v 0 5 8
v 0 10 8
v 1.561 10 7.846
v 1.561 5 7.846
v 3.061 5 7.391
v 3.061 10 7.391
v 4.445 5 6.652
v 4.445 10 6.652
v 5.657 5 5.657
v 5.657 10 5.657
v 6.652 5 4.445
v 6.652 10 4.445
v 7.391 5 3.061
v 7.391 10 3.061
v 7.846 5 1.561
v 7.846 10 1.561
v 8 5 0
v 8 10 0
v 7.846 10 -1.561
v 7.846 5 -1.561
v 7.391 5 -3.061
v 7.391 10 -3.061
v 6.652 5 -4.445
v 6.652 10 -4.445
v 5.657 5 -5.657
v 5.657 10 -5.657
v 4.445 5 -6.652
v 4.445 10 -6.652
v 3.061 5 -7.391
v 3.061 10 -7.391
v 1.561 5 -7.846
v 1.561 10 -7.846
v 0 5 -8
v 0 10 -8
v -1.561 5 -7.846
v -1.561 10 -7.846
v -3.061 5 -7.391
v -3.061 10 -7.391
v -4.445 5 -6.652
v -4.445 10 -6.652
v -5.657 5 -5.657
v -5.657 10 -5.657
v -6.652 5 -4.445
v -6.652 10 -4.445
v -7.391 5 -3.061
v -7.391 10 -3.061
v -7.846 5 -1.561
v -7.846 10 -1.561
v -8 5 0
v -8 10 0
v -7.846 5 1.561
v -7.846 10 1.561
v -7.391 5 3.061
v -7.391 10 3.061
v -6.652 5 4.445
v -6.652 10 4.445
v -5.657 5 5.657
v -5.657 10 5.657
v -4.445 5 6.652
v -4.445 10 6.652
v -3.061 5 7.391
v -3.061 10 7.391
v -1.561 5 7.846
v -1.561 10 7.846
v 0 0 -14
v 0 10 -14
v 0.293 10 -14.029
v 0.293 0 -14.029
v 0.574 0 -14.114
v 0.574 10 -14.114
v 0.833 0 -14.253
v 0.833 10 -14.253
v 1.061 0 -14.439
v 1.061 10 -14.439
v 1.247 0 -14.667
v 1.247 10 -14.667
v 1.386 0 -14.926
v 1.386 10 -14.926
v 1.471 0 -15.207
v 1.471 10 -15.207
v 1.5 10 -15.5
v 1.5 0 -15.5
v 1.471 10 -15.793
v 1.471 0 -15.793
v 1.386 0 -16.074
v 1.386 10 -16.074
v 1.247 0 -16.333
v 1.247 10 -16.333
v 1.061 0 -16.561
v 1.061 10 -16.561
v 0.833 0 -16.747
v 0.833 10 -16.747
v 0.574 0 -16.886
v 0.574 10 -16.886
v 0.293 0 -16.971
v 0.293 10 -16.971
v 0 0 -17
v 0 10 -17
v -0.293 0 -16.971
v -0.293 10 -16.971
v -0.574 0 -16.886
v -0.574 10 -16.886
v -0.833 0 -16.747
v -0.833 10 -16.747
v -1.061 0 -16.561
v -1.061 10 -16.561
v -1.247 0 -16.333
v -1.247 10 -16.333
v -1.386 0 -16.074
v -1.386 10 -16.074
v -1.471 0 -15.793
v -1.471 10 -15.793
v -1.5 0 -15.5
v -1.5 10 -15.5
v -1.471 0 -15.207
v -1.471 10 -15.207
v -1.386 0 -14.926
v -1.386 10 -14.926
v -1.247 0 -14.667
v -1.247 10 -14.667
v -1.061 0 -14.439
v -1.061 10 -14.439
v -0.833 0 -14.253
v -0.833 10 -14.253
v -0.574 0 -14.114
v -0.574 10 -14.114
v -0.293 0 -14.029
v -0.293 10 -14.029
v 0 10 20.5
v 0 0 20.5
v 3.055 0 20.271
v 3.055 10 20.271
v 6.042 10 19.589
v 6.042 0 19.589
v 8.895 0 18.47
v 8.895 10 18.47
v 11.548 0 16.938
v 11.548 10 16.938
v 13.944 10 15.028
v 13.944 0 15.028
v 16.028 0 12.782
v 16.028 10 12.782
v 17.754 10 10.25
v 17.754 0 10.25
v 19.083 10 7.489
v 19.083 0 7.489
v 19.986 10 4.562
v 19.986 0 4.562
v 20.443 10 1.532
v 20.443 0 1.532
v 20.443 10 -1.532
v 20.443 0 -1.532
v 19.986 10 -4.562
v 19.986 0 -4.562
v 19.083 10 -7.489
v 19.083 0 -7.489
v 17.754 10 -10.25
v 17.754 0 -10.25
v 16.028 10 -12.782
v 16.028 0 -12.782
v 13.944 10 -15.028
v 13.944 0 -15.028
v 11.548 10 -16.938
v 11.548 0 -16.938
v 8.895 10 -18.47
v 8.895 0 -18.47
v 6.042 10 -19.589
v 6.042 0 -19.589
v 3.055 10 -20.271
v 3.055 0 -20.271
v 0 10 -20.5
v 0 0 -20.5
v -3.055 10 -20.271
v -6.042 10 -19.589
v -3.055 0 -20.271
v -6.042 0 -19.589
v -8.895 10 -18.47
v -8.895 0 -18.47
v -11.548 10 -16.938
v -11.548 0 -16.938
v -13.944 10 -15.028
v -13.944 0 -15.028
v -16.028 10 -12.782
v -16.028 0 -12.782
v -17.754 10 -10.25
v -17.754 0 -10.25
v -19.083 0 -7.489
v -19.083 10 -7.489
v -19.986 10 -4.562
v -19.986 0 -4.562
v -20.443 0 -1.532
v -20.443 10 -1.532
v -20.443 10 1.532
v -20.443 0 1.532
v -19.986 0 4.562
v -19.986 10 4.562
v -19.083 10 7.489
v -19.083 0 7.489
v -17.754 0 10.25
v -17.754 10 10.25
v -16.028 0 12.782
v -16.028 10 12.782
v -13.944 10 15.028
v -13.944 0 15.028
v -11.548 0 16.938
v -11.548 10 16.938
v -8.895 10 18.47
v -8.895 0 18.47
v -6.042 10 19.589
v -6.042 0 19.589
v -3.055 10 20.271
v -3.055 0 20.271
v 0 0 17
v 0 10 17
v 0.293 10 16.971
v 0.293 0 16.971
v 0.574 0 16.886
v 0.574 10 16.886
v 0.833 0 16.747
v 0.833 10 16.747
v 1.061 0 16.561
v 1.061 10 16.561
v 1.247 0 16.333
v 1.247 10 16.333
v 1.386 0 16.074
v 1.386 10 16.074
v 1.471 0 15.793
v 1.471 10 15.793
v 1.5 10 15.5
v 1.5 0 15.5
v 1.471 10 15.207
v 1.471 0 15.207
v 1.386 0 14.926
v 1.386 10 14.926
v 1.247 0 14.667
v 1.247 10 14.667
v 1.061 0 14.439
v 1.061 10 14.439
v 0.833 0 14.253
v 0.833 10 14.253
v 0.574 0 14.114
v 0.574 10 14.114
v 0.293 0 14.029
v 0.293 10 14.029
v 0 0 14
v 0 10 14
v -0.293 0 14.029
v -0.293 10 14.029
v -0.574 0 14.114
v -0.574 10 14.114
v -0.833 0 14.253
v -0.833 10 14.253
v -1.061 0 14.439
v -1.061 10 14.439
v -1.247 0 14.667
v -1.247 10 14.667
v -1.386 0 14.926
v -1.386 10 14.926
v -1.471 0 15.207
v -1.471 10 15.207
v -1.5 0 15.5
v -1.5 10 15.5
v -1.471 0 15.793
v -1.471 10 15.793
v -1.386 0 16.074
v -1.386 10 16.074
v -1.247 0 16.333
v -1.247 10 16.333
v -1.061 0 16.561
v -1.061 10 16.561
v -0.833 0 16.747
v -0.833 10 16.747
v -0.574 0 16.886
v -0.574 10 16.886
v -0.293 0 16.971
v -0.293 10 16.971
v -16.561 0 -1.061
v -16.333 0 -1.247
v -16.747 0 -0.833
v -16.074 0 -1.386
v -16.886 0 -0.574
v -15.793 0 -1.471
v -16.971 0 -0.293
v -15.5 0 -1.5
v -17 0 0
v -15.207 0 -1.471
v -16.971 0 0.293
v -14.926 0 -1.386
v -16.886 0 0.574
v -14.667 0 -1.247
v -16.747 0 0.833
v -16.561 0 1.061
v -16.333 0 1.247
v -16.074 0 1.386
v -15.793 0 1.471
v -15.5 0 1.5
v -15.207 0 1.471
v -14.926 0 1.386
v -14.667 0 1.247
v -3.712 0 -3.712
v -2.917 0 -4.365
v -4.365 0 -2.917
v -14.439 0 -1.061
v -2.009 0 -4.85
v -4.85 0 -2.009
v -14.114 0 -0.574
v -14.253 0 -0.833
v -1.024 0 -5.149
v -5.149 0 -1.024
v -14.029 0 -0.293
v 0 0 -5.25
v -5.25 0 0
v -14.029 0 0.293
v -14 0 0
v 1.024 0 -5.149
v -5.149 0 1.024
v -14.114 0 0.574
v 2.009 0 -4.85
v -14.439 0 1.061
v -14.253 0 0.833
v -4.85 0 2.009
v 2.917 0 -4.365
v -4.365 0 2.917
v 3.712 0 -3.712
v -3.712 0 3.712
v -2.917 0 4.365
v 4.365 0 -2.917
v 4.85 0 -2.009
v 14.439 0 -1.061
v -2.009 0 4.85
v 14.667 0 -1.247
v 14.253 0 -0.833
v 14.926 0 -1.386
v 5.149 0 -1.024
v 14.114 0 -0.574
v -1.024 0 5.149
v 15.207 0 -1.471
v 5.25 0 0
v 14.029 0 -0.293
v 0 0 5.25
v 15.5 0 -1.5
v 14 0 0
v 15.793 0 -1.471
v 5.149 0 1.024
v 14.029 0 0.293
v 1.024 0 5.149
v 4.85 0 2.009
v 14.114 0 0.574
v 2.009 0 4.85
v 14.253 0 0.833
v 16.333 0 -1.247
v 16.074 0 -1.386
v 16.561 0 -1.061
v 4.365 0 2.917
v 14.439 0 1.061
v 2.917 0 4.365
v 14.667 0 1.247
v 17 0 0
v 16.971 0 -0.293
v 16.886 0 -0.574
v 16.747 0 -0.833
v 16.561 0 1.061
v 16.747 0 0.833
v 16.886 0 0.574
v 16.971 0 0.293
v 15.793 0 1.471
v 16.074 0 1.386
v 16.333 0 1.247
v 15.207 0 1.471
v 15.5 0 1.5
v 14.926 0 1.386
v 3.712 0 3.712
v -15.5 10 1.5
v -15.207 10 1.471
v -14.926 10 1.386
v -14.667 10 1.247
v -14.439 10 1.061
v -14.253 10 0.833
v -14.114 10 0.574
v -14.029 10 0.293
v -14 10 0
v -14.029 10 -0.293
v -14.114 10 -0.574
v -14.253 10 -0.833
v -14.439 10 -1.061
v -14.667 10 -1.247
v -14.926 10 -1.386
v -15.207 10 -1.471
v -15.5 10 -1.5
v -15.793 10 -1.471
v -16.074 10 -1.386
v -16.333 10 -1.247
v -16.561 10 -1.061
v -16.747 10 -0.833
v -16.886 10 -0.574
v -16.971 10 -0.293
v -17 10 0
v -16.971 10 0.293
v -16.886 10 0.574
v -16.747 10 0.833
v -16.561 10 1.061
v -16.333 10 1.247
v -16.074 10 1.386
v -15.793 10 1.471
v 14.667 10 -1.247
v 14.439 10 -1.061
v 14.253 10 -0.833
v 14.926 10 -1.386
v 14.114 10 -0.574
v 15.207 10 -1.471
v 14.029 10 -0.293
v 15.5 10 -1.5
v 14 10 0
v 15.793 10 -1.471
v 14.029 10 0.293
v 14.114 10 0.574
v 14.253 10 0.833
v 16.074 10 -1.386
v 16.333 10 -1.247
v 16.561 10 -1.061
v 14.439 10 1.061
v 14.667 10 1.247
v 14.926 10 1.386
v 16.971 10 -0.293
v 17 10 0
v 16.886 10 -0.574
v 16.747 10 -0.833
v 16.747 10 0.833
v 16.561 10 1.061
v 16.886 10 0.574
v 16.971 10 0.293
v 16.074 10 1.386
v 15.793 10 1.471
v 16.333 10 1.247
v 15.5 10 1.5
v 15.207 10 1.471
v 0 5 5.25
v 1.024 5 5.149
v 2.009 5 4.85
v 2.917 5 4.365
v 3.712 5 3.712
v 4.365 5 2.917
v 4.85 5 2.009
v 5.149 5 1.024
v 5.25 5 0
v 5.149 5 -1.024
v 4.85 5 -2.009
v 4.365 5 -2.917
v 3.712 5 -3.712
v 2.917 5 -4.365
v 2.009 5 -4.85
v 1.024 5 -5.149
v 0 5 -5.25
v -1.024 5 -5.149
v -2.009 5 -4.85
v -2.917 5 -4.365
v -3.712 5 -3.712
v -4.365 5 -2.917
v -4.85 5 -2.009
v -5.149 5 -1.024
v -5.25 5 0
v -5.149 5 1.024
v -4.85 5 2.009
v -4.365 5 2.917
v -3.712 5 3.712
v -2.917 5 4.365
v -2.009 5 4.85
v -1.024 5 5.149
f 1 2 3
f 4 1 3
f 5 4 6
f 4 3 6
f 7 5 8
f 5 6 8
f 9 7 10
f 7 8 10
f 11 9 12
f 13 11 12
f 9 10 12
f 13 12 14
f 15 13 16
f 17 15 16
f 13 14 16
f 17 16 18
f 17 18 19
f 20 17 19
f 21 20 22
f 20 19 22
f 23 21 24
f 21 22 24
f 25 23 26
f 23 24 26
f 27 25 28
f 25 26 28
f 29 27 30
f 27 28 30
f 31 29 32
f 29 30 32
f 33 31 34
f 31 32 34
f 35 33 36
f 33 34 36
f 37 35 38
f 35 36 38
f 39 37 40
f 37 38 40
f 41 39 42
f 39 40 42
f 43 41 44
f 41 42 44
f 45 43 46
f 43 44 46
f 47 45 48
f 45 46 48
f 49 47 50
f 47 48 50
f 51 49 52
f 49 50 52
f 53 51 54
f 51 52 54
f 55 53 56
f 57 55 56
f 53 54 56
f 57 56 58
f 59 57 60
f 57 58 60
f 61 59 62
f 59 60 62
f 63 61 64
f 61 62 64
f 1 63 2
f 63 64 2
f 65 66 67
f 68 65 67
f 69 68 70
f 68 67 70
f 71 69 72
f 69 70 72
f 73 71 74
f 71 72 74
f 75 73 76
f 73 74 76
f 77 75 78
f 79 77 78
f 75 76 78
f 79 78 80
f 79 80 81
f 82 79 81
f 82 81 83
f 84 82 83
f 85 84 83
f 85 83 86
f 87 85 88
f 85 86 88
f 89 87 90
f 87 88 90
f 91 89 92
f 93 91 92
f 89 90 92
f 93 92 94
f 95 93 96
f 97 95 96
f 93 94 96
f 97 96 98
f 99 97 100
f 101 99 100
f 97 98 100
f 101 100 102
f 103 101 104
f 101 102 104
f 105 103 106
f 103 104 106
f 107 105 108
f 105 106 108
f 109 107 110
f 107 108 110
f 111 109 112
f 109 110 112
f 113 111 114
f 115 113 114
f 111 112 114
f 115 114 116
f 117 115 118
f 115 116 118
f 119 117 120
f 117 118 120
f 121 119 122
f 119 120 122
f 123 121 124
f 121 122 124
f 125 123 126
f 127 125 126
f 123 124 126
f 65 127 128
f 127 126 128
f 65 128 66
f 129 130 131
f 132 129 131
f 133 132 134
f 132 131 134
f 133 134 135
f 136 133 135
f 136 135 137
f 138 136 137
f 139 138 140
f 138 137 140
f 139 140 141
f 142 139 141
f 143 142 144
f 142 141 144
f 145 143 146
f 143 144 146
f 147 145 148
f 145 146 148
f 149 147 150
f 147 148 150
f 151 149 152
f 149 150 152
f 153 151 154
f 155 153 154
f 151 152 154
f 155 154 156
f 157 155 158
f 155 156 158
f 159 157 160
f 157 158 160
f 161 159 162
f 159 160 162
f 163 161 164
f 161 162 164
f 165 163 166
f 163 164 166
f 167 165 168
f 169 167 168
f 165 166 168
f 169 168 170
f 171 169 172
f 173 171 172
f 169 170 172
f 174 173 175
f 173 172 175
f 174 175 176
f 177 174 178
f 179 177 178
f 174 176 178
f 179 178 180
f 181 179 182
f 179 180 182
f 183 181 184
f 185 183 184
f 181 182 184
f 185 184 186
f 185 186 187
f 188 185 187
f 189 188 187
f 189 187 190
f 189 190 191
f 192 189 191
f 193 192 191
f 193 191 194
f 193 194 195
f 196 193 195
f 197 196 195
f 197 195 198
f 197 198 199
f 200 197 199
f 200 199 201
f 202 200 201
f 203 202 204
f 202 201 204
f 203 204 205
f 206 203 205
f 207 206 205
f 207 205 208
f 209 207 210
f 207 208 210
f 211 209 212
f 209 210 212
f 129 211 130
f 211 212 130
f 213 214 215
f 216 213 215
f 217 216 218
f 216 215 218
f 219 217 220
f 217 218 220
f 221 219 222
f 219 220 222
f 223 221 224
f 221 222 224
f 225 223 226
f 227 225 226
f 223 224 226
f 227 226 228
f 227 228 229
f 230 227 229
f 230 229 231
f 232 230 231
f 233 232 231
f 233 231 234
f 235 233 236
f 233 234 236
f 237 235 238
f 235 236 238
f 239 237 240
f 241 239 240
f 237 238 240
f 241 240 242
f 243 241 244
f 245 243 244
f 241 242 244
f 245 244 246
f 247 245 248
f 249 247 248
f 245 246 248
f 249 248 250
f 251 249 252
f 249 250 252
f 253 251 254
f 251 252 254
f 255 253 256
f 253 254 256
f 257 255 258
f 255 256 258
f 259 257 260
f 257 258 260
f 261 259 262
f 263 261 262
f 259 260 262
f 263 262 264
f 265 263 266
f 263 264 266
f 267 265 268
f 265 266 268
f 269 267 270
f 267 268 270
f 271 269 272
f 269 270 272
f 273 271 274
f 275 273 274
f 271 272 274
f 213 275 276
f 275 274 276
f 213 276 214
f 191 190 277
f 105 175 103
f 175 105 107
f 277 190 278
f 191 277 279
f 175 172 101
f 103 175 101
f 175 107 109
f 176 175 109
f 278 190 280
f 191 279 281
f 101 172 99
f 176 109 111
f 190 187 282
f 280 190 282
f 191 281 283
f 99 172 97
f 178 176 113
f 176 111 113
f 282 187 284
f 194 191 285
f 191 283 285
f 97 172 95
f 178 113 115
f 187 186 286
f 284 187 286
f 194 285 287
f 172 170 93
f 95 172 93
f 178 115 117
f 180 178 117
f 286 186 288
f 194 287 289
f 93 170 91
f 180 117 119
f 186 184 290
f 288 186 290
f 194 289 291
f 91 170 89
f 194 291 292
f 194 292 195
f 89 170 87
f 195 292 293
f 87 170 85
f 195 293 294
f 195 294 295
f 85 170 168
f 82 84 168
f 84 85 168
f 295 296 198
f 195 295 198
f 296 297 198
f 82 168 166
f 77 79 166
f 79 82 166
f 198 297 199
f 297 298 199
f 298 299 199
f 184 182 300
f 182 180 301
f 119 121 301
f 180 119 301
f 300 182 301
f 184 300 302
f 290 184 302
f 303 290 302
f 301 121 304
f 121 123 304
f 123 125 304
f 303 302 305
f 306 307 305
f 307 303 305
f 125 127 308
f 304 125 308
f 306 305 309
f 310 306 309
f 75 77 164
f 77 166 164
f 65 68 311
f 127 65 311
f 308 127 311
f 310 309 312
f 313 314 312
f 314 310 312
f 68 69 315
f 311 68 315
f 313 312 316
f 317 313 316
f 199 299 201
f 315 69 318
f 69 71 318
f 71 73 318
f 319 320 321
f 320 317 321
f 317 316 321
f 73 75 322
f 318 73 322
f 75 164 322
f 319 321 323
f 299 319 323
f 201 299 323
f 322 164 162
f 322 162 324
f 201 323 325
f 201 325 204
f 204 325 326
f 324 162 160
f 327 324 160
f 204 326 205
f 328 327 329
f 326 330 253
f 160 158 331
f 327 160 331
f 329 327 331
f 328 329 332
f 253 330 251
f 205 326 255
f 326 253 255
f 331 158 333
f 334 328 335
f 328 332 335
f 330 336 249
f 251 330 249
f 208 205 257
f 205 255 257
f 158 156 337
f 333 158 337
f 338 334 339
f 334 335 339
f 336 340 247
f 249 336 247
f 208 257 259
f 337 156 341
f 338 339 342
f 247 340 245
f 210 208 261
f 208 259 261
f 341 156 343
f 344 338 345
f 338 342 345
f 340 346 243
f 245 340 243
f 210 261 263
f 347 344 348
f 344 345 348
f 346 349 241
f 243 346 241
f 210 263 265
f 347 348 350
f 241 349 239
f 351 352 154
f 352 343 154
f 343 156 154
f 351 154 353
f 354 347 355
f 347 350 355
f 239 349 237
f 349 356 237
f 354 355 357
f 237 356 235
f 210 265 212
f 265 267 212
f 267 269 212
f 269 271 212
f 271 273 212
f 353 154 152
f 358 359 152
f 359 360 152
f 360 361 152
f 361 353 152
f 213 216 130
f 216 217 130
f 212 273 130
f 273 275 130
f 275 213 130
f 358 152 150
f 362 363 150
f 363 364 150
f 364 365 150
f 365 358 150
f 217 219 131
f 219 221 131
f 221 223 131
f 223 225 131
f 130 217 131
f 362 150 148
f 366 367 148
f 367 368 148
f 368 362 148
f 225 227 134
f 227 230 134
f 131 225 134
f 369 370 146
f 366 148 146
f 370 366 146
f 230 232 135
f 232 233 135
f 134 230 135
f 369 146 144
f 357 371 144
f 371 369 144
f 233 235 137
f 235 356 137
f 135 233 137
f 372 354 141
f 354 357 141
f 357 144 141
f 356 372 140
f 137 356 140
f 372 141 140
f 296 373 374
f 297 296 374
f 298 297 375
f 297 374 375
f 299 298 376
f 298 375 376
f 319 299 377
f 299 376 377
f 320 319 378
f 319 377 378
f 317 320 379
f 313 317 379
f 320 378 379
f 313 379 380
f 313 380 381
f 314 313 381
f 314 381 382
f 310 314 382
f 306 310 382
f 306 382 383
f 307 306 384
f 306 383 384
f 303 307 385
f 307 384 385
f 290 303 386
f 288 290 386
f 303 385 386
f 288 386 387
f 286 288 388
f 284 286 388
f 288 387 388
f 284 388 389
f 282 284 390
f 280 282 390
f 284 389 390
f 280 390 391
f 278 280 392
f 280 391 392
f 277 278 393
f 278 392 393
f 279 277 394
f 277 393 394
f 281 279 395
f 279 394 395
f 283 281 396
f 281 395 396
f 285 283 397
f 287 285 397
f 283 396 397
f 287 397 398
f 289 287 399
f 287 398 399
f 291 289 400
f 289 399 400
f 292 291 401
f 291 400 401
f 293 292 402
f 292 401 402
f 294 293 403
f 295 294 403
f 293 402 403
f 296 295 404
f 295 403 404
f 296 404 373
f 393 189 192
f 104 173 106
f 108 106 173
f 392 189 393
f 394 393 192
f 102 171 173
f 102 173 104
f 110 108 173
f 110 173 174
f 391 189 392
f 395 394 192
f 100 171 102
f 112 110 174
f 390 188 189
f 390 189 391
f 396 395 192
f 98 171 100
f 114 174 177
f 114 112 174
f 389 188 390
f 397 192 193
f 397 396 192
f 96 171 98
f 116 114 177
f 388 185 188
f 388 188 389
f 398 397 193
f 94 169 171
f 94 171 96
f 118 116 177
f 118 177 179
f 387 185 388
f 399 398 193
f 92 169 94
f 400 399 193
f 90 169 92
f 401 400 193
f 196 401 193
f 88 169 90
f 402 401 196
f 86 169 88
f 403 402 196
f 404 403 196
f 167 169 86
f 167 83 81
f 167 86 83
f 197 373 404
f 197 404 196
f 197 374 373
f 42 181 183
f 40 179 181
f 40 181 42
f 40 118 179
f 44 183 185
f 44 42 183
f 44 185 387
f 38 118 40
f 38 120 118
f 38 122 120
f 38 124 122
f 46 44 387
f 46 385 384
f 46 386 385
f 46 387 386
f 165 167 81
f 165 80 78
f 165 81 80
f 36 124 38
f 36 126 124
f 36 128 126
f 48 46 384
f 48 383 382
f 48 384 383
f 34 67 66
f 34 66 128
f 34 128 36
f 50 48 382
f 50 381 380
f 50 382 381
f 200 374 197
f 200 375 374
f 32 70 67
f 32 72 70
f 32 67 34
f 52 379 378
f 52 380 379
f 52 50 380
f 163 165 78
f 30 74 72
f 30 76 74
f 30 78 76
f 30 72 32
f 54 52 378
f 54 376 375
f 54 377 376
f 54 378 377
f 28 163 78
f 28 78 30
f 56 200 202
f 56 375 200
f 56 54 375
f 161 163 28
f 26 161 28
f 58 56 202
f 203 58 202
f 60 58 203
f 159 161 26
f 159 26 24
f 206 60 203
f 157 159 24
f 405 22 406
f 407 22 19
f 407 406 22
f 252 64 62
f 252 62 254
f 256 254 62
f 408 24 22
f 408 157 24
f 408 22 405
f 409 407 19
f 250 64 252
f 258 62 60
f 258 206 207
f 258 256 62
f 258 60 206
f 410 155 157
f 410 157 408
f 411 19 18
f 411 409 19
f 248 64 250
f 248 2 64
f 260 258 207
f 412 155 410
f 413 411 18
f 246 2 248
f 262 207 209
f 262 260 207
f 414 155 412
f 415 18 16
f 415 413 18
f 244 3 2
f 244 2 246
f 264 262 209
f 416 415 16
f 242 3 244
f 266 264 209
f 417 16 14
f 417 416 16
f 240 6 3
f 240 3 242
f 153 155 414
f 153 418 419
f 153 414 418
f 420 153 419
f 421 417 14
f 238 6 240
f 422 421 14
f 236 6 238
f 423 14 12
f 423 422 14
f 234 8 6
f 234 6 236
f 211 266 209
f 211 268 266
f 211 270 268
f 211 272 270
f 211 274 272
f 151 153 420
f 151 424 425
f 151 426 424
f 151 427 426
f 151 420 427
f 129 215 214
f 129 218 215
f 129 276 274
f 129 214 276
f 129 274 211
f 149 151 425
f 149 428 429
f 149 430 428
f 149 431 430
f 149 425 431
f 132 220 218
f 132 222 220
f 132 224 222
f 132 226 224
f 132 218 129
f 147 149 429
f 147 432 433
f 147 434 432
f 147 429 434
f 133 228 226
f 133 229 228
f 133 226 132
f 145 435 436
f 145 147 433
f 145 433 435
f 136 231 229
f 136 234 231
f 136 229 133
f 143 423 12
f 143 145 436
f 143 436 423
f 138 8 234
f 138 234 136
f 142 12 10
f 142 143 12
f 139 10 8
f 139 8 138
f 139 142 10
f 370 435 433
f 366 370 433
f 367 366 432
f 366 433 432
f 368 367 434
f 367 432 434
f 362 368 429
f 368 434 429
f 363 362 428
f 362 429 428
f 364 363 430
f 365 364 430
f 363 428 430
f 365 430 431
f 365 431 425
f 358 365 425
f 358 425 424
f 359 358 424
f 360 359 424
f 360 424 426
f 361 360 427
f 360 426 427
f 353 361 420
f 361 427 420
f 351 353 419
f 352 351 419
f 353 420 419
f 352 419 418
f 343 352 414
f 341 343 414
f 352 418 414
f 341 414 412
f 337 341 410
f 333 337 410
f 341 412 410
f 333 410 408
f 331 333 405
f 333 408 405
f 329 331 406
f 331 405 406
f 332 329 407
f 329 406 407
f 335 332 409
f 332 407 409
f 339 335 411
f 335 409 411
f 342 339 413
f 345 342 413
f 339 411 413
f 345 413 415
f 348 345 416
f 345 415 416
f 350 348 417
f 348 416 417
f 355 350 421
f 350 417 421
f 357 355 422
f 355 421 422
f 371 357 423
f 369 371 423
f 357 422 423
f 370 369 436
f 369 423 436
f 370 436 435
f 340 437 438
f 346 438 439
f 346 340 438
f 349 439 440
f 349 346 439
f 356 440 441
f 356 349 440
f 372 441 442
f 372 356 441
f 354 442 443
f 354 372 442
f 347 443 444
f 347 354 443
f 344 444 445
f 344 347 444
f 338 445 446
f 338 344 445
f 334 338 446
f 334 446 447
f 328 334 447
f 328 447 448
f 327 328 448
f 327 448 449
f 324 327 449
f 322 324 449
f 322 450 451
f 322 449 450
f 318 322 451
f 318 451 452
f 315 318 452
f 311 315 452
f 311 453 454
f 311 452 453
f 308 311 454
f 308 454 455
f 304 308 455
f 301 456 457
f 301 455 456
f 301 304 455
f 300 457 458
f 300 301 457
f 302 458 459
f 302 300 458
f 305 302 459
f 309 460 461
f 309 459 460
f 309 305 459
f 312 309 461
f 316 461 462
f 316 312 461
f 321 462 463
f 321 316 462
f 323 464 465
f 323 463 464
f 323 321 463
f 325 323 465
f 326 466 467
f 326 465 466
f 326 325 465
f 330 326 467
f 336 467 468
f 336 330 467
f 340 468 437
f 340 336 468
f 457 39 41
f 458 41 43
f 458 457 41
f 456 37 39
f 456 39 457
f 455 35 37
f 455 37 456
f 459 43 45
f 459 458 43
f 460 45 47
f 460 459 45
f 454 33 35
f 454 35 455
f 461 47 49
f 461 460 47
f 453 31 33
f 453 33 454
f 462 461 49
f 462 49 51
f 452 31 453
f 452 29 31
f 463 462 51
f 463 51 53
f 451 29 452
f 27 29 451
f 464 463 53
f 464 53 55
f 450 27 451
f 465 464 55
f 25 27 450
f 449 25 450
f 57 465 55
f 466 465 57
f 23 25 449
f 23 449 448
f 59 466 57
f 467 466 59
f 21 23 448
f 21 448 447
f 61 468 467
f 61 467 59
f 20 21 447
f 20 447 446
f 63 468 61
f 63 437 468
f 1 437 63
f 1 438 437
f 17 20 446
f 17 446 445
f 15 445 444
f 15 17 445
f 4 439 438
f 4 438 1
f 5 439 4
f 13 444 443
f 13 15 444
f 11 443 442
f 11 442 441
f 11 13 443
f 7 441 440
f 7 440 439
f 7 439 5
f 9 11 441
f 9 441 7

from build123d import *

# Parameters (mm, degrees)
SKETCH1_R           = 20.5
SKETCH1_R_2         = 5.25
BOSS_EXTRUDE1_DEPTH = 10
SKETCH2_R           = 8
CUT_EXTRUDE1_DEPTH  = 5
SKETCH5_R           = 1.5
CUT_EXTRUDE2_DEPTH  = 10


with BuildPart() as part:
    # Sketch1 → Boss-Extrude1 (new body)
    with BuildSketch(Plane(origin=(0, 0, 0), x_dir=(1, 0, 0), z_dir=(0, 1, 0))):
        with Locations(Location((0, 0, 0), (0, 0, 270))):
            Circle(SKETCH1_R)
        with Locations(Location((0, 0, 0), (0, 0, 270))):
            Circle(SKETCH1_R_2, mode=Mode.SUBTRACT)
    extrude(amount=BOSS_EXTRUDE1_DEPTH)

    # Sketch2 → Cut-Extrude1 (cut)
    with BuildSketch(Plane(origin=(0, 10, 0), x_dir=(1, 0, 0), z_dir=(0, 1, 0))):
        with Locations(Location((0, 0, 0), (0, 0, 270))):
            Circle(SKETCH2_R)
    extrude(amount=-CUT_EXTRUDE1_DEPTH, mode=Mode.SUBTRACT)

    # Sketch5 → Cut-Extrude2 (cut)
    with BuildSketch(Plane(origin=(0, 10, 0), x_dir=(1, 0, 0), z_dir=(0, 1, 0))):
        with Locations(Location((0, 15.5, 0), (0, 0, 270))):
            Circle(SKETCH5_R)
        with Locations(Location((15.5, 0, 0), (0, 0, 270))):
            Circle(SKETCH5_R)
        with Locations(Location((0, -15.5, 0), (0, 0, 270))):
            Circle(SKETCH5_R)
        with Locations(Location((-15.5, 0, 0), (0, 0, 270))):
            Circle(SKETCH5_R)
    extrude(amount=-CUT_EXTRUDE2_DEPTH, mode=Mode.SUBTRACT)


solid = part.part
